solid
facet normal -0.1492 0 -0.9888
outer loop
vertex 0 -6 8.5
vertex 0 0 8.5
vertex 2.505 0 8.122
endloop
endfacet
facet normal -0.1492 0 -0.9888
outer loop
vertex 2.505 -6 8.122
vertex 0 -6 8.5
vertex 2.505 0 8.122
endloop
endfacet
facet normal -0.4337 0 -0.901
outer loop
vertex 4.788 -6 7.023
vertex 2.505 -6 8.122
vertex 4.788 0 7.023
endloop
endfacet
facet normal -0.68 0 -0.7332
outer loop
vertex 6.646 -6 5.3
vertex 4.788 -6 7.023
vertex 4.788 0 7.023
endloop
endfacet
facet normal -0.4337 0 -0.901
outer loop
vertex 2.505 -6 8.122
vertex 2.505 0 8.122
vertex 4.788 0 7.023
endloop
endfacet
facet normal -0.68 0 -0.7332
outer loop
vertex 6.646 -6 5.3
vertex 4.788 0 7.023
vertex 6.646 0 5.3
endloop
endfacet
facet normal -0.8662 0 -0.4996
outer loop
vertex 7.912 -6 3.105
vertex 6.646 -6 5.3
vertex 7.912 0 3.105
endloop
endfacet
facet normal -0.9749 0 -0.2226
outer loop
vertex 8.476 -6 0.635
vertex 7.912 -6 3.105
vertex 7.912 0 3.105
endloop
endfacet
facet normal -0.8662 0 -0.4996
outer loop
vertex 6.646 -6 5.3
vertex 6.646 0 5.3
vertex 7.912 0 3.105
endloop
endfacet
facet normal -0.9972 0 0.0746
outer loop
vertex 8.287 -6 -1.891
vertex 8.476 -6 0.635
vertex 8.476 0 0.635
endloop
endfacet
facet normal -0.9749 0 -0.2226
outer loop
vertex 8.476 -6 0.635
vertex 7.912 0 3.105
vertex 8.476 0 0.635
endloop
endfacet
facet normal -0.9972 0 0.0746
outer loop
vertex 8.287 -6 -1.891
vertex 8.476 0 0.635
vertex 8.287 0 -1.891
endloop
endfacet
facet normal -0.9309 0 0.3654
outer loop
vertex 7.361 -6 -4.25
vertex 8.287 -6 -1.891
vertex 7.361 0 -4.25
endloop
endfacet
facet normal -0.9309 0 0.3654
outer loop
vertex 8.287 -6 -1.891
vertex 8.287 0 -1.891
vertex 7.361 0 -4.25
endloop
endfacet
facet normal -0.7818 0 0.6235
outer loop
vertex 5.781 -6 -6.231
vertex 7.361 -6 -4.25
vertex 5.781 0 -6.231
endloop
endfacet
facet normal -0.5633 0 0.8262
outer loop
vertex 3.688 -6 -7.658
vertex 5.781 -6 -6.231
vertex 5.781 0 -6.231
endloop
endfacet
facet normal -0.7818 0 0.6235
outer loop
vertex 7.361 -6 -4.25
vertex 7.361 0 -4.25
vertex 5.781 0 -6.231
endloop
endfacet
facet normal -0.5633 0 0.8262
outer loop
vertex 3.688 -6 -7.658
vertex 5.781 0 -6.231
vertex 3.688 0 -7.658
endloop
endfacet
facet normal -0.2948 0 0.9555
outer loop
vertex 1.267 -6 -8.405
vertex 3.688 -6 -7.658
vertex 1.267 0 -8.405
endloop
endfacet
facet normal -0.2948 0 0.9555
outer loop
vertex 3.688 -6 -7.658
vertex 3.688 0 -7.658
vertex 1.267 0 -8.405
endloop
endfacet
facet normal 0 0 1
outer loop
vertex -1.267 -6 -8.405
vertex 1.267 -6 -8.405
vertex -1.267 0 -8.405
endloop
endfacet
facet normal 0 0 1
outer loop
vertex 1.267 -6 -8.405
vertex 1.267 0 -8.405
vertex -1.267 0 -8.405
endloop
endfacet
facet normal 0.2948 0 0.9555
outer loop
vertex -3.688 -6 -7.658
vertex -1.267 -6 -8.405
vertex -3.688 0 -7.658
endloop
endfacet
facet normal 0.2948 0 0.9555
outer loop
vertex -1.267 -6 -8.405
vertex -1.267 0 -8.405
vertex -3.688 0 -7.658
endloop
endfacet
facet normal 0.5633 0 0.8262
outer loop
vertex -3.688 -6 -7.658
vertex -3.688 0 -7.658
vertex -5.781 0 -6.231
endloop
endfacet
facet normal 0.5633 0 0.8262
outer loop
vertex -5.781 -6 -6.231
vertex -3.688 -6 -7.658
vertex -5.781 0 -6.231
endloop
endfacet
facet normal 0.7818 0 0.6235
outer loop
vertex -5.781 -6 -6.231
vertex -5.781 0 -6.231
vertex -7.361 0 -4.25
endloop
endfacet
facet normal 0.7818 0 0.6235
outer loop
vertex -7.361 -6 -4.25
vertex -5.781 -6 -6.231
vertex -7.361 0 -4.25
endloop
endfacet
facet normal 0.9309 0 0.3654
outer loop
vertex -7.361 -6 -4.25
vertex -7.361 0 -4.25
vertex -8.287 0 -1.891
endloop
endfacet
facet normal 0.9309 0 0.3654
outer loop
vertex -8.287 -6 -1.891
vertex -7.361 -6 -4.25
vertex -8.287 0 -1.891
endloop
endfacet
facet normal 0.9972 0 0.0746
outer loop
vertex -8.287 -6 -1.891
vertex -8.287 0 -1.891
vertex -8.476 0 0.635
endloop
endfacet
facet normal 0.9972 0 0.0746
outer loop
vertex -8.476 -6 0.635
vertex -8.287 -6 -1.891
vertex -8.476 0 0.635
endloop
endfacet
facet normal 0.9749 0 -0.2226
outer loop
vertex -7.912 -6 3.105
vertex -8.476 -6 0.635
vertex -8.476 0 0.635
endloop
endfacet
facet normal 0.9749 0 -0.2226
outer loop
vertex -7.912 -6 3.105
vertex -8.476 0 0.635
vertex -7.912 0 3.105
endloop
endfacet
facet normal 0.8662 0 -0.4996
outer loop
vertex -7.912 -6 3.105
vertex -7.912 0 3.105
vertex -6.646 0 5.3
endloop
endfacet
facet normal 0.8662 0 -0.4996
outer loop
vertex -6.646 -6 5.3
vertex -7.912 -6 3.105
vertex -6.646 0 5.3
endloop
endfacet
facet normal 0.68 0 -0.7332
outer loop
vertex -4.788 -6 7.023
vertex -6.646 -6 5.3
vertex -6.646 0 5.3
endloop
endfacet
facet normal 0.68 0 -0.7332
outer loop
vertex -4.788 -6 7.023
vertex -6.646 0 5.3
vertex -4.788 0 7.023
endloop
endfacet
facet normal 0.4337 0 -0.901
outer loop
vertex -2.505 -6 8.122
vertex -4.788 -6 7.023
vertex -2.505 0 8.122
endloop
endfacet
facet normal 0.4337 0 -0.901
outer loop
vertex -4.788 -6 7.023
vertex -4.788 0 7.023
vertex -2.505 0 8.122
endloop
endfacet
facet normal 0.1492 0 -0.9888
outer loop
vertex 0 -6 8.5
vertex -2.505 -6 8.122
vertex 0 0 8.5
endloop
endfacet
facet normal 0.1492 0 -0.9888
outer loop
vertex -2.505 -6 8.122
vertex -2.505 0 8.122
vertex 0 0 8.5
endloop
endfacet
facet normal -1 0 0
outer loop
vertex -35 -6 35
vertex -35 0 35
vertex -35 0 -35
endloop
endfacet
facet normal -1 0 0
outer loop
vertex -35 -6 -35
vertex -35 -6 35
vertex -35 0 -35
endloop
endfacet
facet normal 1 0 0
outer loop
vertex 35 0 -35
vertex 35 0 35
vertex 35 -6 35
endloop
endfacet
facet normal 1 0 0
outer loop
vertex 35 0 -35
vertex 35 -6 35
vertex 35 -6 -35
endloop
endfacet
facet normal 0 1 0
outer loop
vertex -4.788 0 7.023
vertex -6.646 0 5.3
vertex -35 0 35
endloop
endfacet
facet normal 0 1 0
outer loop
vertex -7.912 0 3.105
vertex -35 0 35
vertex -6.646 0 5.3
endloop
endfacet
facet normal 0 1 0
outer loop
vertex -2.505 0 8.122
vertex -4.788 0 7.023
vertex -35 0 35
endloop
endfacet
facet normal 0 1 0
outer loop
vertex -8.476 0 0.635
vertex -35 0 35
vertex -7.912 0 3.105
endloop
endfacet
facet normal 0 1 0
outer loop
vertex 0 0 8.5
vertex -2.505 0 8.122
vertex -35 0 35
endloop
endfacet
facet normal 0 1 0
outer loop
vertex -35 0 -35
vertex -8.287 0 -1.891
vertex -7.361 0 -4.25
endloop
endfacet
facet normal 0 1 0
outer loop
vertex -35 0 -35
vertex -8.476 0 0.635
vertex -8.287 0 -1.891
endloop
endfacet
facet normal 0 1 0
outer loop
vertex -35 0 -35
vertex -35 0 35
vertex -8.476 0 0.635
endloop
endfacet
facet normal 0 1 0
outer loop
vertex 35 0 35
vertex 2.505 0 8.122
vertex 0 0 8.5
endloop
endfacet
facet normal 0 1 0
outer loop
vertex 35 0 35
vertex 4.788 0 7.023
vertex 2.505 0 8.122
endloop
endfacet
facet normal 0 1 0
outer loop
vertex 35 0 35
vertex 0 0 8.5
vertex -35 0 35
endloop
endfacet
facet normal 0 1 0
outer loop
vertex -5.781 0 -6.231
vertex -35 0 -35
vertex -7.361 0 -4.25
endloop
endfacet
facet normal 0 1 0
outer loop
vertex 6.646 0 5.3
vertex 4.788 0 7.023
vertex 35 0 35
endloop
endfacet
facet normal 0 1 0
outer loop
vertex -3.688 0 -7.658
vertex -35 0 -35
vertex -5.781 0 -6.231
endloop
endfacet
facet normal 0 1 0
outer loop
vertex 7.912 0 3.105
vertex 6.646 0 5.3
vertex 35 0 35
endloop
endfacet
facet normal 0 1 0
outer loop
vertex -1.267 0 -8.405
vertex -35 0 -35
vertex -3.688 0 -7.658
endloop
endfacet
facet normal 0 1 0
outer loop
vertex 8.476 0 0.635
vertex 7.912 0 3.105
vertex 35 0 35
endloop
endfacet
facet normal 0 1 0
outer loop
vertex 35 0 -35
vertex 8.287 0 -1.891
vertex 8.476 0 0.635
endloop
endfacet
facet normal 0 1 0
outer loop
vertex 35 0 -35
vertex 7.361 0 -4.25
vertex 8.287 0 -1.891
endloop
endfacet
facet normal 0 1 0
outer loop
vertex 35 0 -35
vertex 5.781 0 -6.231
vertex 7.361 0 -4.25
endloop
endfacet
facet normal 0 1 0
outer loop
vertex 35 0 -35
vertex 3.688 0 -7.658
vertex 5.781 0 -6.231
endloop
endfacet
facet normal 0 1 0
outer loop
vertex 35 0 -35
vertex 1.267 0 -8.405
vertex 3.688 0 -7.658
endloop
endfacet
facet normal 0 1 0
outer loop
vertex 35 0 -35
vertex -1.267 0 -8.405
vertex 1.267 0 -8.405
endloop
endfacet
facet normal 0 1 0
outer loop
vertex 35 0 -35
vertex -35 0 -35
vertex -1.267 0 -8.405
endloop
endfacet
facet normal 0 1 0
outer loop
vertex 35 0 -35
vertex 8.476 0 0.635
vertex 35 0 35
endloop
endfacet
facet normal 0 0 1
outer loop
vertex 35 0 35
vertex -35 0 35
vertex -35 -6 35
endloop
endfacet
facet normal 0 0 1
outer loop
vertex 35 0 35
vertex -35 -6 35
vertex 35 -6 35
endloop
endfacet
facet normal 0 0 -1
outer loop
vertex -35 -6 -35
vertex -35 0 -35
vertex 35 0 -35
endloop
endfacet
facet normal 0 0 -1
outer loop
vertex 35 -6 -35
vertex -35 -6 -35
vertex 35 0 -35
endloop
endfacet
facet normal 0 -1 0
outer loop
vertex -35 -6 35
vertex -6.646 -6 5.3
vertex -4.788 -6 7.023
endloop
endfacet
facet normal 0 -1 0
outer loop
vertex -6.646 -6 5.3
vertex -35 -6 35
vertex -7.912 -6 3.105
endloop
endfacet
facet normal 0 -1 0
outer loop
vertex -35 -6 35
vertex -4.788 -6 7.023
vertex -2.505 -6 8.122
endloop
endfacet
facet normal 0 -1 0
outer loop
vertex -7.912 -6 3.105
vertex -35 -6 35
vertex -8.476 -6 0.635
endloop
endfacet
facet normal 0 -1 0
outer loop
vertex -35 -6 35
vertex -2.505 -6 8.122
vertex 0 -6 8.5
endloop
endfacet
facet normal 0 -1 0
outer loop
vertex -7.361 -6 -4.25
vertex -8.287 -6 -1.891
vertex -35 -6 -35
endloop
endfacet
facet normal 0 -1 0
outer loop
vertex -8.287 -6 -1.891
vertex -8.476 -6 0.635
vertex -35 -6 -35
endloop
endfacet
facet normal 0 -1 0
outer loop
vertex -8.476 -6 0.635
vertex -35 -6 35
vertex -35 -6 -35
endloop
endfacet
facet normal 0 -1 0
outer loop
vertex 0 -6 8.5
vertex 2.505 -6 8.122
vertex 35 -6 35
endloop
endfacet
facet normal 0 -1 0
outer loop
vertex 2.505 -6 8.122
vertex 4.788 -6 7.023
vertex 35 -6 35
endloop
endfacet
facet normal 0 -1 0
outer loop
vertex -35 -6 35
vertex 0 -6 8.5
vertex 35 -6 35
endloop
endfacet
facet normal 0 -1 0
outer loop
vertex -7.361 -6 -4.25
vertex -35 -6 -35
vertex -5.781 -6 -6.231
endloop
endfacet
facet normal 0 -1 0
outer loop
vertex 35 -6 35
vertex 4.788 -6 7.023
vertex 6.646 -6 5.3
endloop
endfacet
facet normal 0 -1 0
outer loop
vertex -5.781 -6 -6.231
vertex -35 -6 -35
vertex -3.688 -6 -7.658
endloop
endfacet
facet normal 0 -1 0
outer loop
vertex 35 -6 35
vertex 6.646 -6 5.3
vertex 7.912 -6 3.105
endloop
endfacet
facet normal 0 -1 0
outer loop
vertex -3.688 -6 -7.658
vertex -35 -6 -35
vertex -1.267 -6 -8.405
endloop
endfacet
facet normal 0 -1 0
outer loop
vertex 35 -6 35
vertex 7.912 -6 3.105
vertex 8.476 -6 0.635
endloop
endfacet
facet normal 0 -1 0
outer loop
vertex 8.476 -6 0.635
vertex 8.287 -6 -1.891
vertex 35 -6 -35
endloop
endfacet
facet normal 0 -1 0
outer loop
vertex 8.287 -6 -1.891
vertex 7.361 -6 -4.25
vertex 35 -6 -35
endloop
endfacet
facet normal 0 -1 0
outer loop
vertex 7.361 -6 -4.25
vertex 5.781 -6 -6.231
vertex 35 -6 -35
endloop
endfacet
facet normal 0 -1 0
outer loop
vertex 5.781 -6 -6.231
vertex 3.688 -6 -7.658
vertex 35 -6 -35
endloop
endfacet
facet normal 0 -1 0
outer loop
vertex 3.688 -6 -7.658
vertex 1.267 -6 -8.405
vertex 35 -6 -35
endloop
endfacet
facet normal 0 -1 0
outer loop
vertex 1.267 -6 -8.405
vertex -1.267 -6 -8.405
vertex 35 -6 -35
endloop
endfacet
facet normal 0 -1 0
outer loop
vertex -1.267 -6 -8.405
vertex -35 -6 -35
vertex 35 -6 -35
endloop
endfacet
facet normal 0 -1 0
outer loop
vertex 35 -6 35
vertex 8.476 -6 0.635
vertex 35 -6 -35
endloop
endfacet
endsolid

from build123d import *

# Parameters (mm, degrees)
SKETCH_1_W             = 70
SKETCH_1_H             = 70
SKETCH_1_R             = 8.5
SM_BASE_FLANGE_1_DEPTH = 6


# Sheet-metal steps are written as plain solids
with BuildPart() as part:
    # Sketch 1 → Базовая кромка1 (new body)
    with BuildSketch(Plane(origin=(0, 0, 0), x_dir=(1, 0, 0), z_dir=(0, 1, 0))):
        Rectangle(SKETCH_1_W, SKETCH_1_H)
        with Locations(Location((0, 0, 0), (0, 0, 270))):
            Circle(SKETCH_1_R, mode=Mode.SUBTRACT)
    extrude(amount=-SM_BASE_FLANGE_1_DEPTH)


solid = part.part
